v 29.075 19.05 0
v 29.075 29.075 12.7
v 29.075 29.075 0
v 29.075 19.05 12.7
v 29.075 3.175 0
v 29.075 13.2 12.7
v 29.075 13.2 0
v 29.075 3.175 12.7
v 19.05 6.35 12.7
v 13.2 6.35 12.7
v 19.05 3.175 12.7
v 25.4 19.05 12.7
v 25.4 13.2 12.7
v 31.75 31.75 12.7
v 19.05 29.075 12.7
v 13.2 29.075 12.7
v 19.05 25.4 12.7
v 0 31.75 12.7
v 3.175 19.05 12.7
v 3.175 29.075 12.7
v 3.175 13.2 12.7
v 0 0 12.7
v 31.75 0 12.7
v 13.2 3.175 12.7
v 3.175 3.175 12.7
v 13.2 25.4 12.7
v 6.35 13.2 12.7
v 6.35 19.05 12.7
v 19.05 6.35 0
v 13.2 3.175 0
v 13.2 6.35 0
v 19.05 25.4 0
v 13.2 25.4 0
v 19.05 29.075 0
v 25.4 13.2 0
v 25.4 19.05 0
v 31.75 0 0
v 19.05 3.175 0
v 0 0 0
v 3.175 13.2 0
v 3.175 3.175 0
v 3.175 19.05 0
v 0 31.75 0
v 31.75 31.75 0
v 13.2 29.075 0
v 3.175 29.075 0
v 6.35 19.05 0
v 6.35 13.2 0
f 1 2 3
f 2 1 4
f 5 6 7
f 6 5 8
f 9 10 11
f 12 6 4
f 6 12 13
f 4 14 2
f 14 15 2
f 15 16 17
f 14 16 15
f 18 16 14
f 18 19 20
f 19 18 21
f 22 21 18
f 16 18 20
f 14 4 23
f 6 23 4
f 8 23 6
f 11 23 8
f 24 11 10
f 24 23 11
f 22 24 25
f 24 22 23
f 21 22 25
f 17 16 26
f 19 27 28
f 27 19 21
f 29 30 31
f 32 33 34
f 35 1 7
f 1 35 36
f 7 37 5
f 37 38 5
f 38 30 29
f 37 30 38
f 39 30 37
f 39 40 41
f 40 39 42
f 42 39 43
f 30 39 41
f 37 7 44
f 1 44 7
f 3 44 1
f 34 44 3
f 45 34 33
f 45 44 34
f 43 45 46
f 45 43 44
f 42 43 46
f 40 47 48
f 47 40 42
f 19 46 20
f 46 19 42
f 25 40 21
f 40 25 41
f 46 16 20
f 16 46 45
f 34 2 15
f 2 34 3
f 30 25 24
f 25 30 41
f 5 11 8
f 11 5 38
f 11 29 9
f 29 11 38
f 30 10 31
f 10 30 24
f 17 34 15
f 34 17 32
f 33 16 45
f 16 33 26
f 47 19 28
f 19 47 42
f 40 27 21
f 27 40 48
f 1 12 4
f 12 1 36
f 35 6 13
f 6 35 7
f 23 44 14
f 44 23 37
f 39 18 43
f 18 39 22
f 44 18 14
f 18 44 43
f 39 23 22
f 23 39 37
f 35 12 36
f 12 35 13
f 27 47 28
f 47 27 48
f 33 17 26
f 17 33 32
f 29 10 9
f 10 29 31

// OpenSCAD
in2mm=25.4;

adjustment=.5;
alSide = in2mm+adjustment;
adSideCuts = .25*in2mm-adjustment;

module aluminium8020(moduleHeight)
{
    difference(){
        cube([alSide, alSide, moduleHeight]);
        
        translate([alSide/2-(adSideCuts/2),0,0]) 
            cube([adSideCuts, adSideCuts, moduleHeight]);
        translate([alSide/2-(adSideCuts/2),alSide-adSideCuts,0])
            cube([adSideCuts, adSideCuts, moduleHeight]);
        translate([0,alSide/2-(adSideCuts/2),0])
            cube([adSideCuts, adSideCuts, moduleHeight]);
        translate([alSide-adSideCuts,alSide/2-(adSideCuts/2),0])
            cube([adSideCuts, adSideCuts, moduleHeight]);
    }
}

module linearBearing(height){
    difference(){
        cube([1.25*in2mm, 1.25*in2mm, height]);
        translate([1/8*in2mm,1/8*in2mm,0])aluminium8020(height);
        translate([(in2mm/4), (in2mm/4),])cube([.75*in2mm, .75*in2mm, height]);
    }
}




linearBearing(.5*in2mm);
